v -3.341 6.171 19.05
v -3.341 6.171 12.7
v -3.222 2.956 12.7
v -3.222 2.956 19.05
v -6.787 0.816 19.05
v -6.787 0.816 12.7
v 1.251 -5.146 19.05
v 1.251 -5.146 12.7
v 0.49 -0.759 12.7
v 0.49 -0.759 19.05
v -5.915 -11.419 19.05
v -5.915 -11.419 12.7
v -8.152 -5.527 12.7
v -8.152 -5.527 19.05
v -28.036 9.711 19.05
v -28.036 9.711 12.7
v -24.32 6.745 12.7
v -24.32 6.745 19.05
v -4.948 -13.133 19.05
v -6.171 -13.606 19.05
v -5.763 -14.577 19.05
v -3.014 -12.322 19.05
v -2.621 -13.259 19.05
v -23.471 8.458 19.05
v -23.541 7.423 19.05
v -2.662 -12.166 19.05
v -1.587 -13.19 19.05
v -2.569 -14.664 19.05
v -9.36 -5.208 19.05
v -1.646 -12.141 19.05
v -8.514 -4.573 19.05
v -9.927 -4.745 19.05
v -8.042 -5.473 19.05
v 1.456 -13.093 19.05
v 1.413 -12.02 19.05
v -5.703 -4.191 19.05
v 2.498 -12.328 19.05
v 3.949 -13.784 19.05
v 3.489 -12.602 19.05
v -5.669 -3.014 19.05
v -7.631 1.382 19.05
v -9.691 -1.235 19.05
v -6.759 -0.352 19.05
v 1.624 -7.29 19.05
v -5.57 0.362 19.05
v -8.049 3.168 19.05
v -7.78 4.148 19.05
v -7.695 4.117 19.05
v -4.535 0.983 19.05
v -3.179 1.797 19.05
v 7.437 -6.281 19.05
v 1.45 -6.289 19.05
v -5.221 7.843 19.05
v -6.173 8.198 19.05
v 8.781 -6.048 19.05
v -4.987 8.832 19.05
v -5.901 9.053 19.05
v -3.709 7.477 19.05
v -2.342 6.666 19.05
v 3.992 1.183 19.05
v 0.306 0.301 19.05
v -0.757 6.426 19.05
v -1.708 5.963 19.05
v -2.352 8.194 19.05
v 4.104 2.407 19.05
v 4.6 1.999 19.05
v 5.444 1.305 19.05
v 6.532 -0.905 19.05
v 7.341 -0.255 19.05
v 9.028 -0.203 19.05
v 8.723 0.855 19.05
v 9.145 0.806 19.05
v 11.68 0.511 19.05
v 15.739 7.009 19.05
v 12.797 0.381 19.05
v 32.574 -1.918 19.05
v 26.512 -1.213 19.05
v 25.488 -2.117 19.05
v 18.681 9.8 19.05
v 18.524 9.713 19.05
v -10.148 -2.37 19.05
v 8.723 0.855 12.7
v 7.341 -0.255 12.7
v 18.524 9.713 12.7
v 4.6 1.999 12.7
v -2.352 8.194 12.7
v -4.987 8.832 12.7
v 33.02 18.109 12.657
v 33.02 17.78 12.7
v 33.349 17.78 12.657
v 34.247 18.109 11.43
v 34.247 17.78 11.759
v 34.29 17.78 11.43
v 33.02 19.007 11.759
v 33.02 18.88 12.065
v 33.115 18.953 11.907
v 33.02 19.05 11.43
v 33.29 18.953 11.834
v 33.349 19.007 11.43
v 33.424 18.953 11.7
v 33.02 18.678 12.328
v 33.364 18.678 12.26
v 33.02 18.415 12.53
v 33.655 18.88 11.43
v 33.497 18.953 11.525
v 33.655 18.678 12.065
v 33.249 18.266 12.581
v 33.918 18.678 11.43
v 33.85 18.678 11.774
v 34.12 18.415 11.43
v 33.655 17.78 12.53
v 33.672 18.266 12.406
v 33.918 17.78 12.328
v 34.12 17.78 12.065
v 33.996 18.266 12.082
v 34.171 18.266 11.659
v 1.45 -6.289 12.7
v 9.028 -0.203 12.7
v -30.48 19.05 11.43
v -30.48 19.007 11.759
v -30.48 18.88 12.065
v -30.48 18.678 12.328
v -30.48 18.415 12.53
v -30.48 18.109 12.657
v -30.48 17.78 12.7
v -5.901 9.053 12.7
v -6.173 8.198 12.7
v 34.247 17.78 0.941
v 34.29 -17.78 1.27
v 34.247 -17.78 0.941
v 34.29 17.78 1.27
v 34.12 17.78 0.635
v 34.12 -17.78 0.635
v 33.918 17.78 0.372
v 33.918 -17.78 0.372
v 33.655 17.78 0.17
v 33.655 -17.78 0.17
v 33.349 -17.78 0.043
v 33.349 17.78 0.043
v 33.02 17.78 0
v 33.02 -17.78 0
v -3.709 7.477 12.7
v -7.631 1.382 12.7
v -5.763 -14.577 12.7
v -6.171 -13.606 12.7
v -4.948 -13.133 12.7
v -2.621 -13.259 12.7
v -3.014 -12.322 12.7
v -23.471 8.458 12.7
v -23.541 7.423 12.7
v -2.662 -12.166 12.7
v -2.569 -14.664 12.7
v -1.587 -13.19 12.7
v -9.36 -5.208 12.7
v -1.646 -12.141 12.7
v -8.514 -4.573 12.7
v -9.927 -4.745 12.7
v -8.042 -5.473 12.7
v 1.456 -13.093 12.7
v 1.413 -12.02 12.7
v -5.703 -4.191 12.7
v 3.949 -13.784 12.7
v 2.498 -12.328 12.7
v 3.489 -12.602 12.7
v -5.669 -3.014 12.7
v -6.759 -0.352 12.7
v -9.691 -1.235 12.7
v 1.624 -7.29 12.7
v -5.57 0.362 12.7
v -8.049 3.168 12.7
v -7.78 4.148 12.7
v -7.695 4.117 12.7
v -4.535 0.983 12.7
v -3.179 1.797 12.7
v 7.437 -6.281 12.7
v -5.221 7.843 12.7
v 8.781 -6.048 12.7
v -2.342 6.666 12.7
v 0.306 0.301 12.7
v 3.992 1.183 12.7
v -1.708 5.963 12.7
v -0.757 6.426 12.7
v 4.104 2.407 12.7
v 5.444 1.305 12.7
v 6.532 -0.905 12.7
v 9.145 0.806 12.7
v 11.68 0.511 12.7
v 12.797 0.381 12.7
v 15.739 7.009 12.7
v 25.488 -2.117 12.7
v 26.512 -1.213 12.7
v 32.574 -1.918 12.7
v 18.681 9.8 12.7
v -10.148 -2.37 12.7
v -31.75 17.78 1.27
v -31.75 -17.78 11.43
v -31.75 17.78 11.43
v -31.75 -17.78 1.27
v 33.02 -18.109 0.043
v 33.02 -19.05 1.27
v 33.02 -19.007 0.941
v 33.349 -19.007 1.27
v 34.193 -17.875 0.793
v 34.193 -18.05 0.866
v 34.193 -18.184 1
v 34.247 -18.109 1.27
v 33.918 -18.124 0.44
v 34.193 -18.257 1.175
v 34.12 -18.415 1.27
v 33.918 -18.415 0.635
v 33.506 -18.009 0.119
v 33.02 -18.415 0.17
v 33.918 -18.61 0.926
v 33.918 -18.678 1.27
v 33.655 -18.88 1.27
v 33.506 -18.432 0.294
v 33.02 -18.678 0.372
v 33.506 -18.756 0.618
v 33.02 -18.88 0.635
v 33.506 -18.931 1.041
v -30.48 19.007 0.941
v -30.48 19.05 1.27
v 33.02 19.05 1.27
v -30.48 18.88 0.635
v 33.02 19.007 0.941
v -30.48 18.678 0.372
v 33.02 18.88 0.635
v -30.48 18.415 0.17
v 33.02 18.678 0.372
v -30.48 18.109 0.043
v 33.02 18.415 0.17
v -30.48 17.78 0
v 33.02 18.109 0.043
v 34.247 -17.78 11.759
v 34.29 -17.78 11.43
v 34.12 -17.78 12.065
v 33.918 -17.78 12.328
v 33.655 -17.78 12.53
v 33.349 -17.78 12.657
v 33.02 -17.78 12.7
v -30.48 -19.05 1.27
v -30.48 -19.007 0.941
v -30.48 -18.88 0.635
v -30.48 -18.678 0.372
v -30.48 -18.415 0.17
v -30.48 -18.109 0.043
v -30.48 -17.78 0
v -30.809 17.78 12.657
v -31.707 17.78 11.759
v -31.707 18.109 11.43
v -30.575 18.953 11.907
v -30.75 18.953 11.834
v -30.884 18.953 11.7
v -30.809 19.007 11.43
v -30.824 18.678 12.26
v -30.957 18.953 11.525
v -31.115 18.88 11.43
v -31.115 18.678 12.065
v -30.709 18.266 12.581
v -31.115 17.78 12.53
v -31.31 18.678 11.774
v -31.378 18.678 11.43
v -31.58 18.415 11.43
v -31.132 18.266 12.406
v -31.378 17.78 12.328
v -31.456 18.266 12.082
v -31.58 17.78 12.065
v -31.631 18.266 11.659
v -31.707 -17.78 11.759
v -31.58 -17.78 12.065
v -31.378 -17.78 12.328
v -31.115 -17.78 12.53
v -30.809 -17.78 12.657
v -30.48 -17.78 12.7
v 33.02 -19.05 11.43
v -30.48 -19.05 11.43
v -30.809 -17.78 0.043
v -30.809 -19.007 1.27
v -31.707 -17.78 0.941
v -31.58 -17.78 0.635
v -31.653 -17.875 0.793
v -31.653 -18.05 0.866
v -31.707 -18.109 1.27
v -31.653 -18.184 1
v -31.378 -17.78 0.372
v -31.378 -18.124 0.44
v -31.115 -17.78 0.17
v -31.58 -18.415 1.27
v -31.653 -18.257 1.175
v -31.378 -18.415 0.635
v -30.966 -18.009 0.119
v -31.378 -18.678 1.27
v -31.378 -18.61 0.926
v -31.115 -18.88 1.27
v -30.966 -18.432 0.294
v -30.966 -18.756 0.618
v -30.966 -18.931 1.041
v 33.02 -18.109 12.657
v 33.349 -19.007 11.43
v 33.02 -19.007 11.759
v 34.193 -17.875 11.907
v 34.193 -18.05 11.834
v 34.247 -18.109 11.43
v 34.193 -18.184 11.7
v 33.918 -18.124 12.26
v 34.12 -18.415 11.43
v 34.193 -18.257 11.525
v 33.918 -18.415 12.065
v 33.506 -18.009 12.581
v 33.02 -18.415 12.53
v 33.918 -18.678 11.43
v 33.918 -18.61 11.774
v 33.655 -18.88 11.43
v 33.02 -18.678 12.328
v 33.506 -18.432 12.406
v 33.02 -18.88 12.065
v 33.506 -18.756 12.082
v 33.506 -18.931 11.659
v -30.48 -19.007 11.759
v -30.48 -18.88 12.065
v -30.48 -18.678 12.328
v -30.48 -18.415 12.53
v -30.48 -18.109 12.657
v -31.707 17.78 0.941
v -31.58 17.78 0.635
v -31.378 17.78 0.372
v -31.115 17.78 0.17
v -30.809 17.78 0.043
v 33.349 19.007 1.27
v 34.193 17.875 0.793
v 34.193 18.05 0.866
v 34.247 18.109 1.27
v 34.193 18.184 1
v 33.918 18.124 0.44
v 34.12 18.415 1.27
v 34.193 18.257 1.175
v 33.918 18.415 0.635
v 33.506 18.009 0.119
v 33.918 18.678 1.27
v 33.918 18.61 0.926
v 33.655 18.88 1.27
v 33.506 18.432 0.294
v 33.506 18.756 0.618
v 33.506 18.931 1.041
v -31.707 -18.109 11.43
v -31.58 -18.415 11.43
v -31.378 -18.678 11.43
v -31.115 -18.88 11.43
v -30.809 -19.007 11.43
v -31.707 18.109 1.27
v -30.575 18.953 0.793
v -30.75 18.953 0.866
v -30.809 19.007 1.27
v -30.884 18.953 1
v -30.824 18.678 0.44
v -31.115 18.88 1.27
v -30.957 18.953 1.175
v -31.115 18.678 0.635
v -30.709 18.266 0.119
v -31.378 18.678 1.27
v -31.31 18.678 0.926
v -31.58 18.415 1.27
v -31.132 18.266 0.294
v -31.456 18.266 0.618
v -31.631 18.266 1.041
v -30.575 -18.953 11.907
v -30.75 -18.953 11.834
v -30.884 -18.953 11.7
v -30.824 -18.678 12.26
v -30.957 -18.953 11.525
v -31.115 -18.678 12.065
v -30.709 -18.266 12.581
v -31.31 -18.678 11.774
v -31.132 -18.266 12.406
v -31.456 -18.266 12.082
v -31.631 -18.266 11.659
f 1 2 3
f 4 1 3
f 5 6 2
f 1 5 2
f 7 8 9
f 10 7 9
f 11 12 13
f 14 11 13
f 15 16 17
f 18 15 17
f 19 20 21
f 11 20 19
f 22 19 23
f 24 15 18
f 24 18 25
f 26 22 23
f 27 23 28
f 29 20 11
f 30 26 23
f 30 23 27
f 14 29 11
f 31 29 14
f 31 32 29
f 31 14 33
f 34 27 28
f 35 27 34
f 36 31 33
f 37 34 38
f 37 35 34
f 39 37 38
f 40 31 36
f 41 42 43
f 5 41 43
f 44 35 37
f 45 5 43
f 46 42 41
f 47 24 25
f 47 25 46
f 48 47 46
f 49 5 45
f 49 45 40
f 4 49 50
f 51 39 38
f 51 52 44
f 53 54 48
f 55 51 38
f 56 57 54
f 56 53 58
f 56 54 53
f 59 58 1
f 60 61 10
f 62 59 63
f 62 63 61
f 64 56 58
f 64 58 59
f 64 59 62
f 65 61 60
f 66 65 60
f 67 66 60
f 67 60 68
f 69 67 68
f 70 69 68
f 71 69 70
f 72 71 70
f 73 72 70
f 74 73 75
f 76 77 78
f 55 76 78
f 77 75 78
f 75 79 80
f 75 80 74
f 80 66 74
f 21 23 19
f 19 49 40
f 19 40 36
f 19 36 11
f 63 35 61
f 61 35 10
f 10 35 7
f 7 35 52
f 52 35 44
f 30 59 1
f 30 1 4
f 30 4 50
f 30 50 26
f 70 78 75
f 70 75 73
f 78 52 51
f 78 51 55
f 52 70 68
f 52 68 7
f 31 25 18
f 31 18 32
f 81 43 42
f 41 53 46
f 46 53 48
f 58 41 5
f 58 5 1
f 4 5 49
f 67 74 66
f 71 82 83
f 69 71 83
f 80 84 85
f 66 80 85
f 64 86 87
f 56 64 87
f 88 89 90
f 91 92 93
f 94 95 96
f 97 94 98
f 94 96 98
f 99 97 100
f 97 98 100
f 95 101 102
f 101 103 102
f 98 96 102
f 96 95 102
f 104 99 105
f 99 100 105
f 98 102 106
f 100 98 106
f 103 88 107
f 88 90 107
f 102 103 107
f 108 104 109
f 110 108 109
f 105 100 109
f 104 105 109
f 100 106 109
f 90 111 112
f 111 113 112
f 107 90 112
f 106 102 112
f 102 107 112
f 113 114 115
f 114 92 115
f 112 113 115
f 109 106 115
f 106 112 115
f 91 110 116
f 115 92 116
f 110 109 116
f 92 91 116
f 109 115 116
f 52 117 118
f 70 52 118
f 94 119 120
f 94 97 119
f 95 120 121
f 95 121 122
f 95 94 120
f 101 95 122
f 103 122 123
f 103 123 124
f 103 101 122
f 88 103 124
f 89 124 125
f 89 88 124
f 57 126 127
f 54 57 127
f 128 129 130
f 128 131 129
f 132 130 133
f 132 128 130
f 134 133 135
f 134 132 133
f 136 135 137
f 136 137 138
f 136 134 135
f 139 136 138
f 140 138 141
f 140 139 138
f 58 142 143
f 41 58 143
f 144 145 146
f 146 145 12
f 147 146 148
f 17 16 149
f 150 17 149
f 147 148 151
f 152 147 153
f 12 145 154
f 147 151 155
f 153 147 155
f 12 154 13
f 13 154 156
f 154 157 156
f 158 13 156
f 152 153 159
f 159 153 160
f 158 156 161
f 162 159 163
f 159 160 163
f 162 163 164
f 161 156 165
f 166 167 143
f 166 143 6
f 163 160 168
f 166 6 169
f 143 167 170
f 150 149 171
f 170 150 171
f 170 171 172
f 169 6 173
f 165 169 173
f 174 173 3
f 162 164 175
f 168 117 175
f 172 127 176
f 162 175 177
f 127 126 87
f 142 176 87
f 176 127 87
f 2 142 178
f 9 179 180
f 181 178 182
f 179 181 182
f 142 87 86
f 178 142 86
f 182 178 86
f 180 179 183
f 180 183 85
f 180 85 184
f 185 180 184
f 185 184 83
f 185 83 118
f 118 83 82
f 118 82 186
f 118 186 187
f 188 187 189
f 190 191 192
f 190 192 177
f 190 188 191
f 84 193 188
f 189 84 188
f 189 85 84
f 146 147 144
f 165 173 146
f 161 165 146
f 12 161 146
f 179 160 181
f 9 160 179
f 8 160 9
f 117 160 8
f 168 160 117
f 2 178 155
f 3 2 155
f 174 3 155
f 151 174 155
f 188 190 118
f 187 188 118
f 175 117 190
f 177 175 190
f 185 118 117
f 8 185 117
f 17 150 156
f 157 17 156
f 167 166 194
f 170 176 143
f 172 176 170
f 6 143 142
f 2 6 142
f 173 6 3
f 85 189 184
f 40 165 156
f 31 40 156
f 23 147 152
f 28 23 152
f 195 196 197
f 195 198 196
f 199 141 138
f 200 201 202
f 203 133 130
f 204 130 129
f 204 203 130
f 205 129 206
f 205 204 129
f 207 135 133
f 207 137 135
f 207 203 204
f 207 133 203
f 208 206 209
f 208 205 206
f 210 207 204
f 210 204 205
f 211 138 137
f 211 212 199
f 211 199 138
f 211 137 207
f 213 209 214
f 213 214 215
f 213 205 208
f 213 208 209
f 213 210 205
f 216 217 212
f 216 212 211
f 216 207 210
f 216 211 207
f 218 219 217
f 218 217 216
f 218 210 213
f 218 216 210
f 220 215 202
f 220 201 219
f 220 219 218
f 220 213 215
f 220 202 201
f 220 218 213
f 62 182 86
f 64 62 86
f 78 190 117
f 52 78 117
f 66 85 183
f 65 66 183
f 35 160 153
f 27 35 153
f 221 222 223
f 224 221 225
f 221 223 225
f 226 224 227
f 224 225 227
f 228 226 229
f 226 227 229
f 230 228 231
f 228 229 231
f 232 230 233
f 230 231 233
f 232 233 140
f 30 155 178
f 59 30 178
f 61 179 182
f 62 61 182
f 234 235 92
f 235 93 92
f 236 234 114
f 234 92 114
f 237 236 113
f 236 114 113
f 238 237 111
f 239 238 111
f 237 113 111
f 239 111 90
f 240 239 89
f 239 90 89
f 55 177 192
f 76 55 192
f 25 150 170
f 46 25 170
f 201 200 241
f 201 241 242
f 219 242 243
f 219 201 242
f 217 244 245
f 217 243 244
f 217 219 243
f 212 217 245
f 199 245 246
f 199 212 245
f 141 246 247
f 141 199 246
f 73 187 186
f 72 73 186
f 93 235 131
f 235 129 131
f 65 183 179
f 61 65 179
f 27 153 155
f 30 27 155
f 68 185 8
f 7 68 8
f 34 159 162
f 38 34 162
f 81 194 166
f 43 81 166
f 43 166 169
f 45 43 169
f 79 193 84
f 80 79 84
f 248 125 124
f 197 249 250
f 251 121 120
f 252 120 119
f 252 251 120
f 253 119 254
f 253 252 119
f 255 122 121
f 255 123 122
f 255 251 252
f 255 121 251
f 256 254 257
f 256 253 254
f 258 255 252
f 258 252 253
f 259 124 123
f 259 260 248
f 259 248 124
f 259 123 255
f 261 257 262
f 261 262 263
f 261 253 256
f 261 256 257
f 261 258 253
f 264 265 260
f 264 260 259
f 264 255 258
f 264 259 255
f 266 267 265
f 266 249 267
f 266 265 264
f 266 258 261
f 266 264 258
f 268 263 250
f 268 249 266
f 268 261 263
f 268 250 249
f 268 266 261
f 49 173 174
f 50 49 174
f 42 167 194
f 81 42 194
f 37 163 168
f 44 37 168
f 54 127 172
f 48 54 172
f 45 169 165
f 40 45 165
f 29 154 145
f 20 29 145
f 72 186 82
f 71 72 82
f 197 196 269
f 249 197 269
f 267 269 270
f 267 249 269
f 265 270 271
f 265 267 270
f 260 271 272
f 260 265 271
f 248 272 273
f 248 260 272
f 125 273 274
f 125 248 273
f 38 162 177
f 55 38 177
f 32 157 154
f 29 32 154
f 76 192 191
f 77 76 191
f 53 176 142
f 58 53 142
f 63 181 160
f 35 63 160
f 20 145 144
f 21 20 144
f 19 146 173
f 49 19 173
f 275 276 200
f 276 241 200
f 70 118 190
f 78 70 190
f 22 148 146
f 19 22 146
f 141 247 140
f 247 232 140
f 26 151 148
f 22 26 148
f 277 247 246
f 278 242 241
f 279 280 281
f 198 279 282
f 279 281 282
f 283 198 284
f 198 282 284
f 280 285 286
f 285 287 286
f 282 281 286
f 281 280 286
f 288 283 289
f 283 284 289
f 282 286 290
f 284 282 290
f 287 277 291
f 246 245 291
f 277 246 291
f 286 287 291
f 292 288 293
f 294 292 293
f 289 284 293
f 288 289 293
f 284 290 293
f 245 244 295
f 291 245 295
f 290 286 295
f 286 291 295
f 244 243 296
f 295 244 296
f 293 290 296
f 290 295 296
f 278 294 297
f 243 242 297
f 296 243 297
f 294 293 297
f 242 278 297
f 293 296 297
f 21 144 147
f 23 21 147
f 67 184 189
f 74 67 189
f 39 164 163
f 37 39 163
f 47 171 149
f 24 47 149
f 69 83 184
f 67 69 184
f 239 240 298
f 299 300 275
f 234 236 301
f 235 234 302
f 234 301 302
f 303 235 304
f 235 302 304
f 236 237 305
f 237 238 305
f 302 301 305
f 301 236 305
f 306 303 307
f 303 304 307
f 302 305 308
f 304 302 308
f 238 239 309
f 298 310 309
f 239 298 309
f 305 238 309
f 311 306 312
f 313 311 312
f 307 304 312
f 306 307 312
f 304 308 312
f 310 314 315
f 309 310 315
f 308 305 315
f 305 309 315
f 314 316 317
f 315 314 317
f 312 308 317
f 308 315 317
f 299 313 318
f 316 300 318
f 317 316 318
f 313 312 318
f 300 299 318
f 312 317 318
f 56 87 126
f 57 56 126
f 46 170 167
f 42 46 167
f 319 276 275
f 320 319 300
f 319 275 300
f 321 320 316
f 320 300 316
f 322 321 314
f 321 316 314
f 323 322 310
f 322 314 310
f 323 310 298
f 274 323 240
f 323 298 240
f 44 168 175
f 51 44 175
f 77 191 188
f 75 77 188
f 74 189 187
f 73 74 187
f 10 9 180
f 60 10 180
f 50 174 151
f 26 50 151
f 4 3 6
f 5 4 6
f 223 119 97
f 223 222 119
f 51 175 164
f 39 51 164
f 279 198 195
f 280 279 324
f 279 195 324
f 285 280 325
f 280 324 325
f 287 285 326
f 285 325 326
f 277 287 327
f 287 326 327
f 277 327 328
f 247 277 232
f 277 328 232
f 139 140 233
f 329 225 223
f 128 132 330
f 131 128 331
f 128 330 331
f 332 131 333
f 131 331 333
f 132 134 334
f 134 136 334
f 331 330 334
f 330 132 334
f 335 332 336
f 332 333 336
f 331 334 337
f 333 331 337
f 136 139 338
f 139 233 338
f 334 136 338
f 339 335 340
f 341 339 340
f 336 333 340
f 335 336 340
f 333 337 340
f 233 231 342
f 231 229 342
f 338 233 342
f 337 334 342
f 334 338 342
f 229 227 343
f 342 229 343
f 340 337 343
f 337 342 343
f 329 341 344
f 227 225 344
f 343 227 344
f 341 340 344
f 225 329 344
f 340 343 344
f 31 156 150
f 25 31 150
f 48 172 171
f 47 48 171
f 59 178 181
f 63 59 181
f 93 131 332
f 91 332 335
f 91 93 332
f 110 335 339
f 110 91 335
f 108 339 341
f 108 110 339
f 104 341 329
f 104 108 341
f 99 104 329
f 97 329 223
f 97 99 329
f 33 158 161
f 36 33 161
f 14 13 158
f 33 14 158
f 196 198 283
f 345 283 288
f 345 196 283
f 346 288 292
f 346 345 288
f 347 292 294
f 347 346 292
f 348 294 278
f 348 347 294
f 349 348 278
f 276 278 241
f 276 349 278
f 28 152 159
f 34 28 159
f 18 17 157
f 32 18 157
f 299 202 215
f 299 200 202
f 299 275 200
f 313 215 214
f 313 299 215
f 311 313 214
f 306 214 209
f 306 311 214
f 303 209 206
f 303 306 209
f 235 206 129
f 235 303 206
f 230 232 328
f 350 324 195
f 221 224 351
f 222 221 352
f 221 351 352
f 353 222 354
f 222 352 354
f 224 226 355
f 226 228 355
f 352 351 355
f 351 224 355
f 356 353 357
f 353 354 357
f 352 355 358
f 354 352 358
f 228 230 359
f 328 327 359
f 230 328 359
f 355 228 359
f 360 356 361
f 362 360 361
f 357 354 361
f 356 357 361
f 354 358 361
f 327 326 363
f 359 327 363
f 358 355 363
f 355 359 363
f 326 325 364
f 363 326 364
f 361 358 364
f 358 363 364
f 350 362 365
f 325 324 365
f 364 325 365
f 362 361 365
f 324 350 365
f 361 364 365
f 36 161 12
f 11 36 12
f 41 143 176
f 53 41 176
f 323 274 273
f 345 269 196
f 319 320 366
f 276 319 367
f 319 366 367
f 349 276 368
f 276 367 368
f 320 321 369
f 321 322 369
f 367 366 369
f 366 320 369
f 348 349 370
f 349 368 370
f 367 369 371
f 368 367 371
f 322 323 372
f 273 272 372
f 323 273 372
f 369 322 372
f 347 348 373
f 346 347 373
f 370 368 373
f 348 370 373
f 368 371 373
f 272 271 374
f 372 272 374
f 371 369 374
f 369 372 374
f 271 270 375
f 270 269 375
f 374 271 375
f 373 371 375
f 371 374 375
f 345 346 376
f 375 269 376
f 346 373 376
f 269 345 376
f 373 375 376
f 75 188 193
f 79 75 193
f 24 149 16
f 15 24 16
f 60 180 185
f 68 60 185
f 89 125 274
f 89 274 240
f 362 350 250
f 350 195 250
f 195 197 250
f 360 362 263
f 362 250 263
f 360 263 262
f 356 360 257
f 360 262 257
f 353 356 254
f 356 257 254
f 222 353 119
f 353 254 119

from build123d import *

# Parameters (mm, degrees)
F0_W     = 66.04
F0_H     = 38.1
F1_DEPTH = 12.7
F3_DEPTH = 6.35
F4_R     = 1.27


with BuildPart() as f1:
    # F0 (on Top) → F1 (new body)
    with BuildSketch(Plane.XY):
        with Locations((1.27, 0)):
            Rectangle(F0_W, F0_H)
    extrude(amount=F1_DEPTH)

    # F4
    f4_edges = [f1.edges().sort_by_distance(p)[0] for p in [
        (-31.75, 0, 12.7),
        (1.27, -19.05, 12.7),
        (34.29, 0, 12.7),
        (1.27, 19.05, 12.7),
        (1.27, -19.05, 0),
        (-31.75, 0, 0),
        (1.27, 19.05, 0),
        (34.29, 0, 0),
        (34.29, -19.05, 6.35),
        (34.29, 19.05, 6.35),
        (-31.75, 19.05, 6.35),
        (-31.75, -19.05, 6.35),
    ]]
    fillet(f4_edges, radius=F4_R)


with BuildPart() as f3:
    # F2 (on face) → F3 (new body)
    with BuildSketch(Plane.XY.offset(12.7)):
        Polygon((-2.621135, -13.258752), (-2.569075, -14.664381), (1.456128, -13.093448), (3.948794, -13.784011), (8.781074, -6.048075), (32.574495, -1.918397), (26.51218, -1.213466), (12.79722, 0.381322), (18.680594, 9.79994), (18.52357, 9.712952), (4.599564, 1.99936), (4.103659, 2.407098), (0.306057, 0.300503), (-0.75713, 6.426131), (-2.352491, 8.193586), (-4.986979, 8.831683), (-5.901284, 9.053136), (-6.172726, 8.198022), (-7.695141, 4.116631), (-7.779743, 4.148188), (-23.470959, 8.457717), (-28.035756, 9.71142), (-24.319806, 6.744927), (-9.927431, -4.744703), (-9.359661, -5.208162), (-6.170621, -13.606421), (-5.763227, -14.577265), align=None)
        Polygon((-5.914504, -11.418882), (-8.151995, -5.526504), (-8.041725, -5.472655), (-5.70304, -4.191147), align=None, mode=Mode.SUBTRACT)
        Polygon((-3.014268, -12.321894), (-4.948232, -13.133442), (-4.535234, 0.982669), (-3.178753, 1.796938), (-2.661591, -12.166448), align=None, mode=Mode.SUBTRACT)
        Polygon((-1.707976, 5.963227), (1.413187, -12.019572), (-1.586652, -13.190332), (-1.645853, -12.14056), (-2.342395, 6.666081), align=None, mode=Mode.SUBTRACT)
        Polygon((7.437476, -6.281275), (3.488988, -12.602359), (2.497871, -12.327782), (1.623557, -7.290361), align=None, mode=Mode.SUBTRACT)
        Polygon((0.490002, -0.759308), (3.992193, 1.183417), (6.531743, -0.904631), (1.25131, -5.145636), align=None, mode=Mode.SUBTRACT)
        Polygon((25.487821, -2.117198), (1.449814, -6.289327), (9.027602, -0.203189), align=None, mode=Mode.SUBTRACT)
        Polygon((-8.514082, -4.572954), (-23.541175, 7.42338), (-8.048819, 3.168467), (-9.691342, -1.234917), (-10.148071, -2.369864), (-6.758529, -0.351933), (-5.569839, 0.361615), (-5.668592, -3.013736), align=None, mode=Mode.SUBTRACT)
        Polygon((-3.221687, 2.956162), (-6.786621, 0.8162), (-3.340745, 6.170736), align=None, mode=Mode.SUBTRACT)
        Polygon((-5.220795, 7.842938), (-3.708536, 7.476656), (-7.630956, 1.381619), align=None, mode=Mode.SUBTRACT)
        Polygon((5.44355, 1.305425), (15.739332, 7.009061), (11.680411, 0.511186), (9.144953, 0.806012), (8.72277, 0.855103), (7.340995, -0.254676), align=None, mode=Mode.SUBTRACT)
    extrude(amount=F3_DEPTH)


solid = Compound([f1.part, f3.part])
